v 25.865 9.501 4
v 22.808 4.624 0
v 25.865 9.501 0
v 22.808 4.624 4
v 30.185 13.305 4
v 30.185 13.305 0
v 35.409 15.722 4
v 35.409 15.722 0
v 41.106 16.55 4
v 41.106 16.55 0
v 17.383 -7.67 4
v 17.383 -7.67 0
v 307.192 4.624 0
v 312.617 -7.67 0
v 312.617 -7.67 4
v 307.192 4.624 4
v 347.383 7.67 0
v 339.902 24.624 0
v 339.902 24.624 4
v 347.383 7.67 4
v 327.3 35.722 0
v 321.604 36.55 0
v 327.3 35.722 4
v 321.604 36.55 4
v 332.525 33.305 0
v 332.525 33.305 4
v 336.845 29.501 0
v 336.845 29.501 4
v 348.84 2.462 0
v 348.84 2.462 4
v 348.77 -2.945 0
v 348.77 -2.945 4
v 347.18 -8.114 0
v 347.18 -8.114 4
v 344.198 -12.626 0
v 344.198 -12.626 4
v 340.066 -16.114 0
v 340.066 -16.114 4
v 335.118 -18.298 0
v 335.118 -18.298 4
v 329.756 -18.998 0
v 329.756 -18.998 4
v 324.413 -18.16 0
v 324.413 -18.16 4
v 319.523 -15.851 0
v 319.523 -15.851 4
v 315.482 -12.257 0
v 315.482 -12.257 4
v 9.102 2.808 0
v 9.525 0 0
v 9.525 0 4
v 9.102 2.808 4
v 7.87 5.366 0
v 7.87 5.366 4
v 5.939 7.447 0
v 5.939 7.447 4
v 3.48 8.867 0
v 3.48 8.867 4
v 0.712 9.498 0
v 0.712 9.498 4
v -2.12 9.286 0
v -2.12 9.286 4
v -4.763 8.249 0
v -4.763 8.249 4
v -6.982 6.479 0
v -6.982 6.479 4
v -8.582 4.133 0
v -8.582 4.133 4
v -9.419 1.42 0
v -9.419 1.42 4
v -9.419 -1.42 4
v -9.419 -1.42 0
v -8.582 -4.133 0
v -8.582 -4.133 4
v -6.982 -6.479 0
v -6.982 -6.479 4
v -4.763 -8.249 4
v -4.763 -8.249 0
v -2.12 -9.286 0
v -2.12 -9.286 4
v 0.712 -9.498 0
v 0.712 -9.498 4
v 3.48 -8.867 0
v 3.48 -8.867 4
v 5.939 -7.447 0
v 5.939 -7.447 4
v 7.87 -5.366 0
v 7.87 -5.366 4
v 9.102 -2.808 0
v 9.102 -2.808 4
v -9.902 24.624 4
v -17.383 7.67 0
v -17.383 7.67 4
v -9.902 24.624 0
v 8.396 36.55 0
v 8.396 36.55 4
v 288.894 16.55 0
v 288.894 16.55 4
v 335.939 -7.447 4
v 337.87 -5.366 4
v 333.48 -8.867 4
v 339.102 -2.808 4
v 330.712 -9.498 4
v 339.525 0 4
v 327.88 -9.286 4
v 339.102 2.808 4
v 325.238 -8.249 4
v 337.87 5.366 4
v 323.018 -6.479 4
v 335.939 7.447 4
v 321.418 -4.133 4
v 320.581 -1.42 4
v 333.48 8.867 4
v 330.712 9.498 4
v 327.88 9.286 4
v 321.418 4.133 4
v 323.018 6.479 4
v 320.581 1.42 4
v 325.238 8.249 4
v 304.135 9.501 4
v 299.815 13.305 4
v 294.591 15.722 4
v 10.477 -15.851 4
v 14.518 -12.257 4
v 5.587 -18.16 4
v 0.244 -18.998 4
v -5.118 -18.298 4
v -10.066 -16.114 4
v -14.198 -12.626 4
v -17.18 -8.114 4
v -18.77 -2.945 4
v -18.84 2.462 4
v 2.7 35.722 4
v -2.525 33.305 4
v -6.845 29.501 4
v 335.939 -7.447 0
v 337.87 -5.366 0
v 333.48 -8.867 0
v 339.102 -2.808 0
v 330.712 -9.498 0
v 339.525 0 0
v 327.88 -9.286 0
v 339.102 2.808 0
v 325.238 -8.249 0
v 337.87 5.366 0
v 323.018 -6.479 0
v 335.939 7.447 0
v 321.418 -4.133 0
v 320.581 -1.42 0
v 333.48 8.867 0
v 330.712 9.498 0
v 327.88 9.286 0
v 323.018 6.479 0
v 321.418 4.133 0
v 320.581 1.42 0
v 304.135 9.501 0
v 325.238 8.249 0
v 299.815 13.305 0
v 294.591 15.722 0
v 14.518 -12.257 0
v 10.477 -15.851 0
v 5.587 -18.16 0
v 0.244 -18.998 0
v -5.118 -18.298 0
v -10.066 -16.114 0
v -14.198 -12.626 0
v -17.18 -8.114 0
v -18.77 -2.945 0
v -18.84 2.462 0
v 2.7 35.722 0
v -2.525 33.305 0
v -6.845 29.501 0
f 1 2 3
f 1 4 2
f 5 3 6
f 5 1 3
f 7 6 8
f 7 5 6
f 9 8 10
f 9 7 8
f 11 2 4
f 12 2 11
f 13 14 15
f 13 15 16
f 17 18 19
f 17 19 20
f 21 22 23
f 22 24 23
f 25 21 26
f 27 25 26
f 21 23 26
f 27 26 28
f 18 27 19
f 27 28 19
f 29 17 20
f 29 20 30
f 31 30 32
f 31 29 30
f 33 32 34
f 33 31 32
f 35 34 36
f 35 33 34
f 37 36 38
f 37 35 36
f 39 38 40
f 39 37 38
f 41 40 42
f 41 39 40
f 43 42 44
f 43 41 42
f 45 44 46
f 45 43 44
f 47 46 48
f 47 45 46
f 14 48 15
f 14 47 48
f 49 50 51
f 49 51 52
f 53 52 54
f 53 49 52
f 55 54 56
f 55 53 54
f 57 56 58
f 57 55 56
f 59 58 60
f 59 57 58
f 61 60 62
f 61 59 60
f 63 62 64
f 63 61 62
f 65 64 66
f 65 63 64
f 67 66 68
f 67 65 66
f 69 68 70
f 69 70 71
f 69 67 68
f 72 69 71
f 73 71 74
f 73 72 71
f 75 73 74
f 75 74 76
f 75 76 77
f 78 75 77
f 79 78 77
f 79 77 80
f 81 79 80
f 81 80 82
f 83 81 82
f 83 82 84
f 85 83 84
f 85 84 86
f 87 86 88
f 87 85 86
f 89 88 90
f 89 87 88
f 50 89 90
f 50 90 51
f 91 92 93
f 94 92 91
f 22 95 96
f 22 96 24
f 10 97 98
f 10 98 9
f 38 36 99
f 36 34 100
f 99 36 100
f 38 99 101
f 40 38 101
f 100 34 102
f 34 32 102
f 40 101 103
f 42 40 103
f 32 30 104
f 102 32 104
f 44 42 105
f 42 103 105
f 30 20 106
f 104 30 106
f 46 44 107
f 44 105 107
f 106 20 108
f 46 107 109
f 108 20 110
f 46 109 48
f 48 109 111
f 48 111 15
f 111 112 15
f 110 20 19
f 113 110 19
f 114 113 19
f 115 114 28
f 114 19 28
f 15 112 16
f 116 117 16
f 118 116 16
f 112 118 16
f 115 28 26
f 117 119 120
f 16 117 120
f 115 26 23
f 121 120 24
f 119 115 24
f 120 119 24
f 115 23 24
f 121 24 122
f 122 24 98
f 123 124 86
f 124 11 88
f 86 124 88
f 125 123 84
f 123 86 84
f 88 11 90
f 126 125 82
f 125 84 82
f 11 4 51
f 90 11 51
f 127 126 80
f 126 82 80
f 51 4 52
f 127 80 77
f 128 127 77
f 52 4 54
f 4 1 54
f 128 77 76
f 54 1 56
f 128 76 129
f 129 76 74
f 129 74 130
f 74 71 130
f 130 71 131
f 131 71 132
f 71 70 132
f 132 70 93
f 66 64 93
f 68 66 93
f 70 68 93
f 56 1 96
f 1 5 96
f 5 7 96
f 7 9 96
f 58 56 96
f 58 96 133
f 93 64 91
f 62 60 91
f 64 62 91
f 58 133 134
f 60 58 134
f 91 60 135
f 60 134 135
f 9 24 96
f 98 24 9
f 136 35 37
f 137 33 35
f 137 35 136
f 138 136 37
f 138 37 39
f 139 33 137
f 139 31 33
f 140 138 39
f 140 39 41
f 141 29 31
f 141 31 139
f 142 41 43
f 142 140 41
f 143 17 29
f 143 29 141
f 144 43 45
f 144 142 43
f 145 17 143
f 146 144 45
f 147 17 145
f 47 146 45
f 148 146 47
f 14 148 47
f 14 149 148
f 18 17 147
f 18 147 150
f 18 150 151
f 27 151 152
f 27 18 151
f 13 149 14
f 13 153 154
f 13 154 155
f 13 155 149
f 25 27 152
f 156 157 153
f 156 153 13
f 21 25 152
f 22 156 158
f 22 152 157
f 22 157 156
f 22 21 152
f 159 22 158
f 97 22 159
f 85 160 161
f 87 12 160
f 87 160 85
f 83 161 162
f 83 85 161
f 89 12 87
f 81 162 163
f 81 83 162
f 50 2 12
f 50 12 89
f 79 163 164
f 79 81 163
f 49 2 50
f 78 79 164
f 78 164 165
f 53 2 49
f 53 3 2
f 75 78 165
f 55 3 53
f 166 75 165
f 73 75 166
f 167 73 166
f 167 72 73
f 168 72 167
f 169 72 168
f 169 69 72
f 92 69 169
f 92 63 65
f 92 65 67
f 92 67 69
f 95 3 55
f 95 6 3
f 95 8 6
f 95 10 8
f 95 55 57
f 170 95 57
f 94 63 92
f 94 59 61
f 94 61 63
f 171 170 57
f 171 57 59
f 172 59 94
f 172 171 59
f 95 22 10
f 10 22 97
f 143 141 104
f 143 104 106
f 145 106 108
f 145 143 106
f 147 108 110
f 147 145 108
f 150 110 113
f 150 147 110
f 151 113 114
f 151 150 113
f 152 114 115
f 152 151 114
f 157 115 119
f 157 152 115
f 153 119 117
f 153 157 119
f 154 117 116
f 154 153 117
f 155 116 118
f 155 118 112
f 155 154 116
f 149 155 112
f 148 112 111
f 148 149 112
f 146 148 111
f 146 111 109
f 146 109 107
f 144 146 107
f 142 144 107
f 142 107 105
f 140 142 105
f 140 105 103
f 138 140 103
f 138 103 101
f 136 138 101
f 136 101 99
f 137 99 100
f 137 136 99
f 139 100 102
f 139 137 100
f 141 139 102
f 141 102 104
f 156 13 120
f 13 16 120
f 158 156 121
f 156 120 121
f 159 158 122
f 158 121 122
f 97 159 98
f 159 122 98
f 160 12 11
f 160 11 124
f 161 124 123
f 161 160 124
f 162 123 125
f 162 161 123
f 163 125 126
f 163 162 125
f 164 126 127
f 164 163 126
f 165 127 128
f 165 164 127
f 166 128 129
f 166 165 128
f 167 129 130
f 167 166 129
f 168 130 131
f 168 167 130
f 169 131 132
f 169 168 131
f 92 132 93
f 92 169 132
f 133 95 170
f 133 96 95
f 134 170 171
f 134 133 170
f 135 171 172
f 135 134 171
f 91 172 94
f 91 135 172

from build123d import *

# Parameters (mm, degrees)
SKETCH_1_R      = 9.525
EXTRUDE_1_DEPTH = 4
FILLET_1_R      = 20


with BuildPart() as part:
    # 草图1 → 凸台-拉伸1 (new body)
    with BuildSketch(Plane.XY):
        with BuildLine():
            Line((-4.63962822, 36.550100793), (334.63962822, 36.550100793))
            Line((334.63962822, 36.550100793), (347.382944688, 7.670282522))
            ThreePointArc((347.382944688, 7.670282522), (337.670282522, -17.382944688), (312.617055312, -7.670282522))
            Line((312.617055312, -7.670282522), (301.929730112, 16.550100793))
            Line((301.929730112, 16.550100793), (28.070269888, 16.550100793))
            Line((28.070269888, 16.550100793), (17.382944688, -7.670282522))
            ThreePointArc((17.382944688, -7.670282522), (-7.670282522, -17.382944688), (-17.382944688, 7.670282522))
            Line((-17.382944688, 7.670282522), (-4.63962822, 36.550100793))
        make_face()
        Circle(SKETCH_1_R, mode=Mode.SUBTRACT)
        with Locations((330, 0)):
            Circle(SKETCH_1_R, mode=Mode.SUBTRACT)
    extrude(amount=EXTRUDE_1_DEPTH)

    # 圆角1
    fillet_1_edges = [part.edges().sort_by_distance(p)[0] for p in [
        (-4.63962822, 36.550100793, 2),
        (334.63962822, 36.550100793, 2),
        (301.929730112, 16.550100793, 2),
        (28.070269888, 16.550100793, 2),
    ]]
    fillet(fillet_1_edges, radius=FILLET_1_R)


solid = part.part
